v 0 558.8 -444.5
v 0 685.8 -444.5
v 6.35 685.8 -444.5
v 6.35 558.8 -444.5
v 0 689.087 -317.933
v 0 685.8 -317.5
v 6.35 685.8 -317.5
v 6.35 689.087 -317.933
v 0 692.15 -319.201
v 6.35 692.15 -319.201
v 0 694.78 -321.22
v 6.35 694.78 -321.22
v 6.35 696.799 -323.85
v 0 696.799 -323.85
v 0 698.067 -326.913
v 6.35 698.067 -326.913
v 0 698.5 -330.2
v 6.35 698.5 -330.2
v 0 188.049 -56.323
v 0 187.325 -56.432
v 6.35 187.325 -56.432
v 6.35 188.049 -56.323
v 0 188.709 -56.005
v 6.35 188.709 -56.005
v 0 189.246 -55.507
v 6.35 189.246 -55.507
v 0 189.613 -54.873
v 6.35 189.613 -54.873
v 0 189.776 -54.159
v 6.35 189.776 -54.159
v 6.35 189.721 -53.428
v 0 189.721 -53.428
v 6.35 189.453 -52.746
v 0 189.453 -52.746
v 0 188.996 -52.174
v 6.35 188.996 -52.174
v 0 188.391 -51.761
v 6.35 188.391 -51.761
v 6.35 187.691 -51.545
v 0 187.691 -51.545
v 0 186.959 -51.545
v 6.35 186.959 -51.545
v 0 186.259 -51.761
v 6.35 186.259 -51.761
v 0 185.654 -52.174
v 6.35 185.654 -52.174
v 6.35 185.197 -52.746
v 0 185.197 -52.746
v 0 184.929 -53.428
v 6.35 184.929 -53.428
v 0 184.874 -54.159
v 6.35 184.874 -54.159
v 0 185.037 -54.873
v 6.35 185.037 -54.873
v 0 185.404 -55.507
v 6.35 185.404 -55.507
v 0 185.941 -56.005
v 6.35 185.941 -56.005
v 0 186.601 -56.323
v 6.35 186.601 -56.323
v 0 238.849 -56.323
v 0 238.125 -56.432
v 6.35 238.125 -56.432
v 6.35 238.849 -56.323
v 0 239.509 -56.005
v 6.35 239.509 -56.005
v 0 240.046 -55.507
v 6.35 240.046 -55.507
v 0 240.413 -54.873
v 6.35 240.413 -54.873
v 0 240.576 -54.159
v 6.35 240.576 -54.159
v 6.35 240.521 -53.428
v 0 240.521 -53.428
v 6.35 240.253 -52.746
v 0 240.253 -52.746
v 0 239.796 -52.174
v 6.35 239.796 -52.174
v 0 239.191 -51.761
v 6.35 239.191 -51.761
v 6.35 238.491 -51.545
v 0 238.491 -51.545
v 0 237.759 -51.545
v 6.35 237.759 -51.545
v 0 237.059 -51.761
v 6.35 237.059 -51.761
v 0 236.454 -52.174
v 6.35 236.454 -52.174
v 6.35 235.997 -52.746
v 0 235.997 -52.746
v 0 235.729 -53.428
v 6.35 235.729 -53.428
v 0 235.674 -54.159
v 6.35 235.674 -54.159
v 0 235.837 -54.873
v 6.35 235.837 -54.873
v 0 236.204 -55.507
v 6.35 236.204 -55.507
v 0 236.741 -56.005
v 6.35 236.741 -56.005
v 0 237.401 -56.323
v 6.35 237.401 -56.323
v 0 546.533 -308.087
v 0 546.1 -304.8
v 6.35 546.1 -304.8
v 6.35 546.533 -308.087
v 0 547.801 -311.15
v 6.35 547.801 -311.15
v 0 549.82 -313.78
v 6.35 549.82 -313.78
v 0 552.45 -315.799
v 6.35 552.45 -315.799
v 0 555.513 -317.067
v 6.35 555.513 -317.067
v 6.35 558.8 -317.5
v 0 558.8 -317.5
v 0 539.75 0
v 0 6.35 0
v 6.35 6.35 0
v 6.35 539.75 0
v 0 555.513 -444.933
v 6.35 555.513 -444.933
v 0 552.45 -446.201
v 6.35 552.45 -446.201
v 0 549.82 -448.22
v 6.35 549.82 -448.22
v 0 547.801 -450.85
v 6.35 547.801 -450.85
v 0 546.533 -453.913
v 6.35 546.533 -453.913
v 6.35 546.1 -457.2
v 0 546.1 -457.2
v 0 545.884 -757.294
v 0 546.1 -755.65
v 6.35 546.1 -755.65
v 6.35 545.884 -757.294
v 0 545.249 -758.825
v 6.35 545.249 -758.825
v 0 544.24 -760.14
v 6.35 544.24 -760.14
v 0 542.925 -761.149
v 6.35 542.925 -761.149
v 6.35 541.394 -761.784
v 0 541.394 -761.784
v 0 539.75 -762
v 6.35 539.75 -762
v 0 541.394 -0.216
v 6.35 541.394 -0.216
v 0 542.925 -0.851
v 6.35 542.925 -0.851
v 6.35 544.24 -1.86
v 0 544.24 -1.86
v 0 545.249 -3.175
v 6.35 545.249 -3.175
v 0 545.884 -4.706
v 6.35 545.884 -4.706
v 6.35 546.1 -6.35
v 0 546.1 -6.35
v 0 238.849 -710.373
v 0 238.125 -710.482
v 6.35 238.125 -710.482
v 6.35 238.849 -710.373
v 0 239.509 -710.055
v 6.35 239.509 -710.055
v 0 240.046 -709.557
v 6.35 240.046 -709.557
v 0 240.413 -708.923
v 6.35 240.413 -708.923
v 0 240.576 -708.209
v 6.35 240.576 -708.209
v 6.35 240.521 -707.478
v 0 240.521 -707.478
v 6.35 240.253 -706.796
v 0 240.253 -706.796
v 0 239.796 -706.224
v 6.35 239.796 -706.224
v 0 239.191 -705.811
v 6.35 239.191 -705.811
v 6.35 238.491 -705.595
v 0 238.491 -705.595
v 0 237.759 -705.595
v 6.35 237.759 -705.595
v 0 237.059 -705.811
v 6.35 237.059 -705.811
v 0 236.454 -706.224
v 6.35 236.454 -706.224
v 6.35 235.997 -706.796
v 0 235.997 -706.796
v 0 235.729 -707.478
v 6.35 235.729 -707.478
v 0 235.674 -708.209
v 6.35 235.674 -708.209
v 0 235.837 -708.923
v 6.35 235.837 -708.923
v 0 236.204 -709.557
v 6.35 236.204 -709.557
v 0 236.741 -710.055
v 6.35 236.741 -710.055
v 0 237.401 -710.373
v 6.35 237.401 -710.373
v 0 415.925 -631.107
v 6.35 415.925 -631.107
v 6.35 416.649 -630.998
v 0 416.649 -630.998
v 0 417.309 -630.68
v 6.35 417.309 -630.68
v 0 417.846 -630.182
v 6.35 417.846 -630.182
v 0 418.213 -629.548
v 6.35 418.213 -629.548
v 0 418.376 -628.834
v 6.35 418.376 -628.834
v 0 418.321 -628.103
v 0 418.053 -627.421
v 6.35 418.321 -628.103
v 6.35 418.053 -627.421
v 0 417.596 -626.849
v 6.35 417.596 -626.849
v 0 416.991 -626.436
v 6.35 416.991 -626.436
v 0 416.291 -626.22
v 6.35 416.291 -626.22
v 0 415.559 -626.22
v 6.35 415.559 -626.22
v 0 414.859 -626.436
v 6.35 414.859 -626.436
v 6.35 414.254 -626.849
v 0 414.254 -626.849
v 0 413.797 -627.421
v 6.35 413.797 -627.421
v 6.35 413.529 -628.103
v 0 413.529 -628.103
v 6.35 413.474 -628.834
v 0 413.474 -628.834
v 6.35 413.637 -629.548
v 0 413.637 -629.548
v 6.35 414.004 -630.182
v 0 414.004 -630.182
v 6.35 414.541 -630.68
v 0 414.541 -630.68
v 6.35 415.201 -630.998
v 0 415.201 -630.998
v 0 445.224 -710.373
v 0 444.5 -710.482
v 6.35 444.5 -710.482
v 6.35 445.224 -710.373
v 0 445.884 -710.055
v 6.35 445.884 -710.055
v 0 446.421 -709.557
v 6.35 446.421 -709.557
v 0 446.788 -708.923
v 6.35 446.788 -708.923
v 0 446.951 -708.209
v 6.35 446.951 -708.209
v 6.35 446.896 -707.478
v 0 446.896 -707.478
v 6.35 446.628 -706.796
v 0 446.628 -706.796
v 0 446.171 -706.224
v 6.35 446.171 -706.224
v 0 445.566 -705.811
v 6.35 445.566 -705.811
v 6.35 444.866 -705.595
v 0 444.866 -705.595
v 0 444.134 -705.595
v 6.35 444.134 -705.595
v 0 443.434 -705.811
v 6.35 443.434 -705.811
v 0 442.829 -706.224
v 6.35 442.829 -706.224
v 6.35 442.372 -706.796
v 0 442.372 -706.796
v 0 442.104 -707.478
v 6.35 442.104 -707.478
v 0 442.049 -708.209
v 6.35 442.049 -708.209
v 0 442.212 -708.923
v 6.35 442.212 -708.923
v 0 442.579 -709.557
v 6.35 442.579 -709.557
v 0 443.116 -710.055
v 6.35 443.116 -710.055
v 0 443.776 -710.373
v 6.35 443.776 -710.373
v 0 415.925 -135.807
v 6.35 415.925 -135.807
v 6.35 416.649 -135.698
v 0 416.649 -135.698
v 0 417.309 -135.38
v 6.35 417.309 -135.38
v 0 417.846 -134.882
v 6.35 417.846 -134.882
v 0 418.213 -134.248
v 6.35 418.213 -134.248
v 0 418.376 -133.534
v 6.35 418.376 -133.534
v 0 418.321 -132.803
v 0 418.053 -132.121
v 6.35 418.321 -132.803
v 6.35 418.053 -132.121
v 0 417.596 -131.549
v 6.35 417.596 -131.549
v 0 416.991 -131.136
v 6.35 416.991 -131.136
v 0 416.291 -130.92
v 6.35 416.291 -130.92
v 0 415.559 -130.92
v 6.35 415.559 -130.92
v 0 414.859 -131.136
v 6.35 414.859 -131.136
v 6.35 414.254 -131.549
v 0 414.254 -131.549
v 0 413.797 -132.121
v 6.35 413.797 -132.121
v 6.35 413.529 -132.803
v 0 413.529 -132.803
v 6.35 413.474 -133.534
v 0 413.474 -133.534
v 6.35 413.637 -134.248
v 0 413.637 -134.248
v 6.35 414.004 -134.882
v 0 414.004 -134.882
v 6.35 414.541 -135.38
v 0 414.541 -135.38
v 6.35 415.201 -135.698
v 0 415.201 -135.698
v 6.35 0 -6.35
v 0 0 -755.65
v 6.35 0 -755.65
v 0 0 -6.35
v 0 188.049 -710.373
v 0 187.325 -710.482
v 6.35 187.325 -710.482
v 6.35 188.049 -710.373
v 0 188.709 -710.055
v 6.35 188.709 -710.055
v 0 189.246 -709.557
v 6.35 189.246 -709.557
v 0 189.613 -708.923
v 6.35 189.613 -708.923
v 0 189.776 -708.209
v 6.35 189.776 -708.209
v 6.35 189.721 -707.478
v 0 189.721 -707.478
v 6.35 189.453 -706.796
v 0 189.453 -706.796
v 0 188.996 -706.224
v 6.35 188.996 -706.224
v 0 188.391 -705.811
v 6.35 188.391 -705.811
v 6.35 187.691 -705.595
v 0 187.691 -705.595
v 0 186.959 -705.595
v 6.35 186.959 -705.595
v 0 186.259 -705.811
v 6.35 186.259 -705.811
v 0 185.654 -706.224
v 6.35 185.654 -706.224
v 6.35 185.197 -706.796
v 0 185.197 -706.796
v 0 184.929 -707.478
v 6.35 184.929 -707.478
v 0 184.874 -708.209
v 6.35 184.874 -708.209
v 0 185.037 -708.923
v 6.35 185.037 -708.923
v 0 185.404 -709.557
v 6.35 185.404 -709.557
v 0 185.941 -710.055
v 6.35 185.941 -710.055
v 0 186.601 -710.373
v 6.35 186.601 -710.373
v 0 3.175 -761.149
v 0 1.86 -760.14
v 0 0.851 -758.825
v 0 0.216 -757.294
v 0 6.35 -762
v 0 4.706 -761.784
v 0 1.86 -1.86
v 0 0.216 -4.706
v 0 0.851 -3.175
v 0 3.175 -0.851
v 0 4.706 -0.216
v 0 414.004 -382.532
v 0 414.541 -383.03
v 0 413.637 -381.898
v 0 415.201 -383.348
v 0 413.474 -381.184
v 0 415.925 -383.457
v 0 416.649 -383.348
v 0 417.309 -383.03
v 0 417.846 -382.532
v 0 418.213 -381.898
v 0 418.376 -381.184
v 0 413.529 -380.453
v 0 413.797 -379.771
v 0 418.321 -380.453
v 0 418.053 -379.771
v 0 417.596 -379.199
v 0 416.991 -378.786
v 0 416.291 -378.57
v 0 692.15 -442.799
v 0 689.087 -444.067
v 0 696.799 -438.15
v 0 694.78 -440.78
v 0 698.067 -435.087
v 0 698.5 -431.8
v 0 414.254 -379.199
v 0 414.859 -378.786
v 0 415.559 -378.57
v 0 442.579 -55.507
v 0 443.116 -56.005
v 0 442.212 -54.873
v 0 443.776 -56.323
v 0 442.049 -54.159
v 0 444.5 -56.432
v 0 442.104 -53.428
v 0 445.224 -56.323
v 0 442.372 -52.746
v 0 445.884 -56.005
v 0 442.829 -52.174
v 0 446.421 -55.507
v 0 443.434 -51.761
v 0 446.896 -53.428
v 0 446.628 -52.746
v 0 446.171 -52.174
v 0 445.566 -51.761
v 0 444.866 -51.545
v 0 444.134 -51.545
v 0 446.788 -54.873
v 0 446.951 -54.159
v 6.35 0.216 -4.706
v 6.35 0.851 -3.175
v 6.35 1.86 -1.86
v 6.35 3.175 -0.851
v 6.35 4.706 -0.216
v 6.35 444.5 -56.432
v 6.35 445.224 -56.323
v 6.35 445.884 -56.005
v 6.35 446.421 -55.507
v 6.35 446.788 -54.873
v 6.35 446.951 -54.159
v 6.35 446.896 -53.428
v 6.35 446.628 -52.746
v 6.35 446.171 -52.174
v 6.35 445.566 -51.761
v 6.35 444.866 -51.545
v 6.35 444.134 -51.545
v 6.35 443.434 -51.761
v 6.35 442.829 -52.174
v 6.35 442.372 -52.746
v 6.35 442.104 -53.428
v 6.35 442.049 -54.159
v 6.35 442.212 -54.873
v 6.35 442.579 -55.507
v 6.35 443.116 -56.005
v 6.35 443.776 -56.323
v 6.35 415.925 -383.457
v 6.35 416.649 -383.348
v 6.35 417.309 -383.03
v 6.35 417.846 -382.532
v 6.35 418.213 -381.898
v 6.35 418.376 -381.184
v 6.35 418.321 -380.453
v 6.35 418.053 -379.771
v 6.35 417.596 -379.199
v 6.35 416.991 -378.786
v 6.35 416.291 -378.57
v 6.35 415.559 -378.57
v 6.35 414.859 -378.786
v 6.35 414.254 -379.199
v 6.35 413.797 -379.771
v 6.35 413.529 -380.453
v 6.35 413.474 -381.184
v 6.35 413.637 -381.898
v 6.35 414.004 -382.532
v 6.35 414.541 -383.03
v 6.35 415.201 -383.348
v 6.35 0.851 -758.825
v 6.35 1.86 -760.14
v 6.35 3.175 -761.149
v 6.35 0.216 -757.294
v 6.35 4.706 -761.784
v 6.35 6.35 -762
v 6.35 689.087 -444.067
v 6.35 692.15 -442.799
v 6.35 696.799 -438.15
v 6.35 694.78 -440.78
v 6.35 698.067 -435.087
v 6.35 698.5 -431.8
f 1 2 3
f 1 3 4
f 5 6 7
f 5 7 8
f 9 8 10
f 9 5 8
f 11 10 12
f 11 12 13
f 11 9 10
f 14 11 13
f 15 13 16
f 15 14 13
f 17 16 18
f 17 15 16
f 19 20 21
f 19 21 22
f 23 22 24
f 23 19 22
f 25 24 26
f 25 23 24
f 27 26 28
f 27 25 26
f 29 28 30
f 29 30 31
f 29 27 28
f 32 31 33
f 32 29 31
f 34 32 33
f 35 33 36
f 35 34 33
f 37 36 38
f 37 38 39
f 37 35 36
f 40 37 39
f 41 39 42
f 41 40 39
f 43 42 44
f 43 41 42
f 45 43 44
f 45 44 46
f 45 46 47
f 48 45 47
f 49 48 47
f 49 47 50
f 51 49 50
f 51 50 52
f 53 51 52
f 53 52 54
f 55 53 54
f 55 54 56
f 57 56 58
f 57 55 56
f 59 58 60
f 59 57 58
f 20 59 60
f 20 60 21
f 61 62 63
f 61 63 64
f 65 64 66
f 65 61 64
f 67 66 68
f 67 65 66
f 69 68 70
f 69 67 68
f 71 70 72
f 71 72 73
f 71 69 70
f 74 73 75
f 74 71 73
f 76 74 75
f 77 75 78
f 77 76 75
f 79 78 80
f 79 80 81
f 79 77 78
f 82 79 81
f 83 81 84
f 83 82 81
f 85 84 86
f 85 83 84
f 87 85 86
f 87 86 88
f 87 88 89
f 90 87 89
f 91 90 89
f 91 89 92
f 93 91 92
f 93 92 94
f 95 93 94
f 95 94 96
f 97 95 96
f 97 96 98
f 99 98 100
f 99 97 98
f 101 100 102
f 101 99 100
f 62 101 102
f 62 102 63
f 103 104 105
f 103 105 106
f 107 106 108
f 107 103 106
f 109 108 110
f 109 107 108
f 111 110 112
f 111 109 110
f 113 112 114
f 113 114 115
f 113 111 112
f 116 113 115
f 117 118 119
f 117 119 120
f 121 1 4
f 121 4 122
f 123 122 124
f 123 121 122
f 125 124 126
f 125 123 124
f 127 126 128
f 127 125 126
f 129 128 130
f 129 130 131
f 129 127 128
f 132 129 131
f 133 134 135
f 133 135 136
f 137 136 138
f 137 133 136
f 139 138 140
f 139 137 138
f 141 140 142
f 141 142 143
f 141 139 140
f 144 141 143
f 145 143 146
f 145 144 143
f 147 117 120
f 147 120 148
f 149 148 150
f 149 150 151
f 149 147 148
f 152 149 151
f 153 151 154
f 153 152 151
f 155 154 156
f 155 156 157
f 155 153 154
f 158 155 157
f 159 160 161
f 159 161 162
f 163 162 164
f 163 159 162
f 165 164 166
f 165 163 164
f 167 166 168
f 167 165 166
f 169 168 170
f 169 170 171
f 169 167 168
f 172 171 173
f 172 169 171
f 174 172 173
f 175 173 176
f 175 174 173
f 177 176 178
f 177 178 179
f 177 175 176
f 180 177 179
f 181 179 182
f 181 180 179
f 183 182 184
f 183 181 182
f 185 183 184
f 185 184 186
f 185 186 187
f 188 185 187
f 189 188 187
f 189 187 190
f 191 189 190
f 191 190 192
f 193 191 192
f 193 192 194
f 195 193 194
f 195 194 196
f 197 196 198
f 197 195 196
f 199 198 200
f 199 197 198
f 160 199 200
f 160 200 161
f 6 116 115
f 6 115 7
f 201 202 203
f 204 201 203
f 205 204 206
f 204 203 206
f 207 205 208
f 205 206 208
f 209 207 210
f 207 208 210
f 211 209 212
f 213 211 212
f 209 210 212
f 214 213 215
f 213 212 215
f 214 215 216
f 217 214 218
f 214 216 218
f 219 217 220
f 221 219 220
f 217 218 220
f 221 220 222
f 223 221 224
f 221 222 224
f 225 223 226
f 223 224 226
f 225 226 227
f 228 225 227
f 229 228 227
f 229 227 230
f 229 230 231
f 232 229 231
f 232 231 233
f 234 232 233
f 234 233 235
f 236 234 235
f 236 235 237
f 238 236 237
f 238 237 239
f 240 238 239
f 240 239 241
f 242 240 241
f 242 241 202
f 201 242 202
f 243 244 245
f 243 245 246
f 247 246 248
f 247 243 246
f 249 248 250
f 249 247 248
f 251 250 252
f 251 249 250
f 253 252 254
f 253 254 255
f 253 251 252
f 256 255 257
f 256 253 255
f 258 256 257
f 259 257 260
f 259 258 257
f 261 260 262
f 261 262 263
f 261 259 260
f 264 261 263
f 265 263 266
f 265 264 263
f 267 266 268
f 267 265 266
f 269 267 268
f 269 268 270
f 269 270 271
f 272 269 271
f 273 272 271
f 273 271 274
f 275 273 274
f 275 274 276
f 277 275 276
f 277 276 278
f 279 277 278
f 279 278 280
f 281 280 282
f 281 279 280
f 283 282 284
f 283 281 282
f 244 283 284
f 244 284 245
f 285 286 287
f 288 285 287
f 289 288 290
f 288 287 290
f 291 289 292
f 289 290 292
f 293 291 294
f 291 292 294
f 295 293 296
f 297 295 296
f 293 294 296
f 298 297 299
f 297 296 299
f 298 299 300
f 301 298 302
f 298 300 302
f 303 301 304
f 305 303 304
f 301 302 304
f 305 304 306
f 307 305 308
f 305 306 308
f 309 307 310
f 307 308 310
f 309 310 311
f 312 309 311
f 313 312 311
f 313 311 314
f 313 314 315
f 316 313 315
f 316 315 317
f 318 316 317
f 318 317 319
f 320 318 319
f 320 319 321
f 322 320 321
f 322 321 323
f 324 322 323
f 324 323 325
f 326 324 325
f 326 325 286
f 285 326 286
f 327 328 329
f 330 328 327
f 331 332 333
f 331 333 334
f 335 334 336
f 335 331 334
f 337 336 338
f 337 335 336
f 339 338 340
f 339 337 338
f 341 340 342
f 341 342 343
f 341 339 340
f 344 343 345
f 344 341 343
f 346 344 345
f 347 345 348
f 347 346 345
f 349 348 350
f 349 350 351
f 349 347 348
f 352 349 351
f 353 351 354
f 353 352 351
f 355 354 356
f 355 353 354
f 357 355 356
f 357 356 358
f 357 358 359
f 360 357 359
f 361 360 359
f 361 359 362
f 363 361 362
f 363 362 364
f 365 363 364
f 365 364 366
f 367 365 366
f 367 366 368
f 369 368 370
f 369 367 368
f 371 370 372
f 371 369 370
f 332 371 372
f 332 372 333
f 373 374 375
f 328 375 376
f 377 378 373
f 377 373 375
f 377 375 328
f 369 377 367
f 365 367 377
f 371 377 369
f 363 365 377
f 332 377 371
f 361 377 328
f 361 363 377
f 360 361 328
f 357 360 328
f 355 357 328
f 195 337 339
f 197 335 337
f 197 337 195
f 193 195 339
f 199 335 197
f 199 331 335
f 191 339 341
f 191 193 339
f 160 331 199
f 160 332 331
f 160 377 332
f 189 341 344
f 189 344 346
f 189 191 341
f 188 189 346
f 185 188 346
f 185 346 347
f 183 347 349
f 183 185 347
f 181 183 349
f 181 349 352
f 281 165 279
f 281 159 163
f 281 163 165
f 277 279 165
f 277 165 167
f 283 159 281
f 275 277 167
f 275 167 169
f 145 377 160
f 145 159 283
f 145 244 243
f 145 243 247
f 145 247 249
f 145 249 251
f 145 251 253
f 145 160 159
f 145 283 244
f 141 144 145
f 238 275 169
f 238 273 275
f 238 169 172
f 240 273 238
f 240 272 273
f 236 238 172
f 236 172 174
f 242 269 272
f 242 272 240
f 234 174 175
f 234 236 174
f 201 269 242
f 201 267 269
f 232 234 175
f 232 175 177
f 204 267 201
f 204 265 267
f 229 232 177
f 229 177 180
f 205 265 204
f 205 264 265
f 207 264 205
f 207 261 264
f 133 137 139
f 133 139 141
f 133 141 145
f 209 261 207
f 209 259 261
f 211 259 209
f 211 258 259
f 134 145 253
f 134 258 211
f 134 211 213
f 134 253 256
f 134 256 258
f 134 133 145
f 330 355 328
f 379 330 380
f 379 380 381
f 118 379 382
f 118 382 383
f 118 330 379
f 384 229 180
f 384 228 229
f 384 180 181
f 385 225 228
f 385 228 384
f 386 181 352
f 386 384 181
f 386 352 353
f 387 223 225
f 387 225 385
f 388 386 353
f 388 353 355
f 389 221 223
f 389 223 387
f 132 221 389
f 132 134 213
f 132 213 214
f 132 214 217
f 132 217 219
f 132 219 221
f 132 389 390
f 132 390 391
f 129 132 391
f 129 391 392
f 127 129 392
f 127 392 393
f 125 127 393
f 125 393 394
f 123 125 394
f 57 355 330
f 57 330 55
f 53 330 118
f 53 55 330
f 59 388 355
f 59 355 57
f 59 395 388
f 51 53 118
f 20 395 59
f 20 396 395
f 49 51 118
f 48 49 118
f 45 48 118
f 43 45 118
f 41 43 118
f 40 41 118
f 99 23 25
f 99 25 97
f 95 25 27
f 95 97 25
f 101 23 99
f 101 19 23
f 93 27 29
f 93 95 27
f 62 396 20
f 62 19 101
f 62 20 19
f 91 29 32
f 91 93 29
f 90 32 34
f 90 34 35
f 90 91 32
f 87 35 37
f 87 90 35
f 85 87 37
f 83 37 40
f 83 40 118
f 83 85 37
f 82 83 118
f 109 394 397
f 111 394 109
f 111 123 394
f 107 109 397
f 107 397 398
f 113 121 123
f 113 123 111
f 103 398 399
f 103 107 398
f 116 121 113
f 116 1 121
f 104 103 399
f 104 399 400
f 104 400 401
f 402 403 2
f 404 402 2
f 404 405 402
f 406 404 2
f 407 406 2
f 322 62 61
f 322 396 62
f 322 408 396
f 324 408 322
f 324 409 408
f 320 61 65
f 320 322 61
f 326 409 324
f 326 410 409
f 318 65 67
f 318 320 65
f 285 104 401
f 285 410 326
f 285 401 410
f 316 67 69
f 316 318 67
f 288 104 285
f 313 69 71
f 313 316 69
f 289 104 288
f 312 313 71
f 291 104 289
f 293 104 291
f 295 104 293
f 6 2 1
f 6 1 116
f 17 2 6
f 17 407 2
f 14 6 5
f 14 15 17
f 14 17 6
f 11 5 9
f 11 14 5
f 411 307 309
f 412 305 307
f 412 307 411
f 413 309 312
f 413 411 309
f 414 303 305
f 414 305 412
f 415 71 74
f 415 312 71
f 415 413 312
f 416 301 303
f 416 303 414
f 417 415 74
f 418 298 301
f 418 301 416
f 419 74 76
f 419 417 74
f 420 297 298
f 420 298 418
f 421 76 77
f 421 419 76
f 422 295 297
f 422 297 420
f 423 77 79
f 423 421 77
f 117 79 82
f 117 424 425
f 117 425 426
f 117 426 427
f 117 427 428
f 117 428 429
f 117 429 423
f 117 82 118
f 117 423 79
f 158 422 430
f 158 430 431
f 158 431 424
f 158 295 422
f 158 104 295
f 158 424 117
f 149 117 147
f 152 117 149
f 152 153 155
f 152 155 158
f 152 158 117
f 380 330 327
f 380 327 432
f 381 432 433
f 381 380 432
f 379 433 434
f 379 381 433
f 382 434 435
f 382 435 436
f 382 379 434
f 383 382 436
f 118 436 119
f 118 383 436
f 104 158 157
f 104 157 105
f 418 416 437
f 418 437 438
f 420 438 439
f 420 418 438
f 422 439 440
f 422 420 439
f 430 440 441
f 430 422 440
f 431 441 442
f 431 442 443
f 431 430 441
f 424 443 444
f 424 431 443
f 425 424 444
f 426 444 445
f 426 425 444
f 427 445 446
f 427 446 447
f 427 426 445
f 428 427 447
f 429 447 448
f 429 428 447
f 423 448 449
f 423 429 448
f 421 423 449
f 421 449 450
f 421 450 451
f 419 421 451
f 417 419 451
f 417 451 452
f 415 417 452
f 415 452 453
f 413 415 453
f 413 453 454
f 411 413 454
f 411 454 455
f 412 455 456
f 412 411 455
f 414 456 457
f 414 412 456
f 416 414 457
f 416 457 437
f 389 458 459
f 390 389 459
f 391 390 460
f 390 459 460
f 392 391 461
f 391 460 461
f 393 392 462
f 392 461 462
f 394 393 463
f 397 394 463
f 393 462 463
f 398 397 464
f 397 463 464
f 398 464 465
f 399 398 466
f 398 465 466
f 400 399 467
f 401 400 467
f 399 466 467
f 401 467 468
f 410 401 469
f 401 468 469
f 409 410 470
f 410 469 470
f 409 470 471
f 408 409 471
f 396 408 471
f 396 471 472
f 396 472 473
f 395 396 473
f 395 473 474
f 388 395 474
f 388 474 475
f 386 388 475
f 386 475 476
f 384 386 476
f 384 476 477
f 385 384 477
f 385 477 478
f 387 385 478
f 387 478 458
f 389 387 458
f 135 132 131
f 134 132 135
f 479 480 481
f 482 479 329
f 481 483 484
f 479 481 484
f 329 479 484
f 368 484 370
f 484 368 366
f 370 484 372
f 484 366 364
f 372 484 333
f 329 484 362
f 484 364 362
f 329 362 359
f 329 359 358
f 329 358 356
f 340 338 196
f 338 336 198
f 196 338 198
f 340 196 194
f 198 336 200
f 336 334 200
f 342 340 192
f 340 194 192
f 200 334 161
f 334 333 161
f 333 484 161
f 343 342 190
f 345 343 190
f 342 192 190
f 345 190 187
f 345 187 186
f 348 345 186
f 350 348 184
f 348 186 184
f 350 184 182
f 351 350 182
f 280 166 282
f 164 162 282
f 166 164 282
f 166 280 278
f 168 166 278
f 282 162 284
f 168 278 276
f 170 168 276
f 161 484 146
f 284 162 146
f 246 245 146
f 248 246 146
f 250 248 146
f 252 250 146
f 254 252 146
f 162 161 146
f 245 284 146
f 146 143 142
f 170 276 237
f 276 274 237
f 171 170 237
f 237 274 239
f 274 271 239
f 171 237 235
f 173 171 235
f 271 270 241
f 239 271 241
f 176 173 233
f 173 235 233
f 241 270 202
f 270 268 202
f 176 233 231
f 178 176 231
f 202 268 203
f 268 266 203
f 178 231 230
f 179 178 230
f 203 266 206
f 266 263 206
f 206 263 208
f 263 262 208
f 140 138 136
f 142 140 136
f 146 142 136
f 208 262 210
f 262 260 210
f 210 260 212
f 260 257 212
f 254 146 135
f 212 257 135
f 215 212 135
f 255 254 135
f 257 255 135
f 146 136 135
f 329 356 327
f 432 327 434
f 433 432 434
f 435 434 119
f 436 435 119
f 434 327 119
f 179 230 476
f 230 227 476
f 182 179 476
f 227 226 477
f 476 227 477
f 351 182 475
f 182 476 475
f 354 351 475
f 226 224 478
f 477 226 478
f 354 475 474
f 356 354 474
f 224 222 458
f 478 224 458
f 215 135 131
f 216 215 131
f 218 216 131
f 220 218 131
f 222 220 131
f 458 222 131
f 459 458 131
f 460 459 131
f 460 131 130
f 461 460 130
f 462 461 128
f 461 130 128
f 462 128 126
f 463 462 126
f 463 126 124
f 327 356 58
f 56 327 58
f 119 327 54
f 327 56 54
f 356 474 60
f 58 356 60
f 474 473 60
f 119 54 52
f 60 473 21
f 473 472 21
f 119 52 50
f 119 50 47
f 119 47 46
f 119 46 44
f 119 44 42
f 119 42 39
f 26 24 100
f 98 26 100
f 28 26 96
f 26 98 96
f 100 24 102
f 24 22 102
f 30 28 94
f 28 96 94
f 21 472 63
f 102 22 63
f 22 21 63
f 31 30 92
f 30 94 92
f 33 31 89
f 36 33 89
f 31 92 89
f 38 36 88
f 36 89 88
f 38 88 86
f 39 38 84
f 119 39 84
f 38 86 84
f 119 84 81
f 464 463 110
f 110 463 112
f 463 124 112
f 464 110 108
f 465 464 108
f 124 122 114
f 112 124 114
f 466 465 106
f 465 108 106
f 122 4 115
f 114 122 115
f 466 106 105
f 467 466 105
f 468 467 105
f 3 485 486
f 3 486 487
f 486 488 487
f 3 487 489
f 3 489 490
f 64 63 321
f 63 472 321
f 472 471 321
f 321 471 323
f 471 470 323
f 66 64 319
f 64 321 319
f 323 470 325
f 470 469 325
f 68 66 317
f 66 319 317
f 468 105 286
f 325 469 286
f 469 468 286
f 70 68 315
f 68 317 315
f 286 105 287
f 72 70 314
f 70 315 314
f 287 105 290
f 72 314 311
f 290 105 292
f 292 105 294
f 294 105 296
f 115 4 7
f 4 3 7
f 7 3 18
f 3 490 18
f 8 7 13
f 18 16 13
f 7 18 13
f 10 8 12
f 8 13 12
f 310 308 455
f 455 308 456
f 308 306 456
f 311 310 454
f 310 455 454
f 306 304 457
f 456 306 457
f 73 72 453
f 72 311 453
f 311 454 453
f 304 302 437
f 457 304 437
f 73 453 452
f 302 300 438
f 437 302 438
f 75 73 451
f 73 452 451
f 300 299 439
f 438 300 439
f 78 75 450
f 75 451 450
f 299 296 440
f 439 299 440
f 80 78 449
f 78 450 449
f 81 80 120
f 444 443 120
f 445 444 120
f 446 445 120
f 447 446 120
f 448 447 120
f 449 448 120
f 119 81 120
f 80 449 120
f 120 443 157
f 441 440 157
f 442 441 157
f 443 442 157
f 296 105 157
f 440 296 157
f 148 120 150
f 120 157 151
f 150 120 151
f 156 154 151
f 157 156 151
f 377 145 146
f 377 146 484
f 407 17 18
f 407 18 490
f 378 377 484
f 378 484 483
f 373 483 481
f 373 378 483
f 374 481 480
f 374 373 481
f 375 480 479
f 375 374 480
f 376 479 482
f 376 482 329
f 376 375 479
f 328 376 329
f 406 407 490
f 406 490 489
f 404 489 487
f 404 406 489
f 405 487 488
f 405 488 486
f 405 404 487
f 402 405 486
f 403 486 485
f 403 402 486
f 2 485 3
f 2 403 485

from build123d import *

# Parameters (mm, degrees)
SKETCH1_R           = 2.45745
BOSS_EXTRUDE1_DEPTH = 6.35
SKETCH3_R           = 2.45745
CUT_EXTRUDE2_DEPTH  = 1034.724611538


with BuildPart() as part:
    # Sketch1 → Boss-Extrude1 (new body)
    with BuildSketch(Plane(origin=(0, 0, 0), x_dir=(0, 0, -1), z_dir=(1, 0, 0))):
        with BuildLine():
            Line((457.2, 546.1), (755.65, 546.1))
            ThreePointArc((755.65, 546.1), (760.140128061, 544.240128061), (762, 539.75))
            Line((762, 539.75), (762, 6.35))
            ThreePointArc((762, 6.35), (760.140128061, 1.859871939), (755.65, 0))
            Line((755.65, 0), (6.35, 0))
            ThreePointArc((6.35, 0), (1.859871939, 1.859871939), (0, 6.35))
            Line((0, 6.35), (0, 539.75))
            ThreePointArc((0, 539.75), (1.859871939, 544.240128061), (6.35, 546.1))
            Line((6.35, 546.1), (304.8, 546.1))
            ThreePointArc((304.8, 546.1), (313.780256121, 549.819743879), (317.5, 558.8))
            Line((317.5, 558.8), (317.5, 685.8))
            ThreePointArc((317.5, 685.8), (321.219743879, 694.780256121), (330.2, 698.5))
            Line((330.2, 698.5), (431.8, 698.5))
            ThreePointArc((431.8, 698.5), (440.780256121, 694.780256121), (444.5, 685.8))
            Line((444.5, 685.8), (444.5, 558.8))
            ThreePointArc((444.5, 558.8), (448.219743879, 549.819743879), (457.2, 546.1))
        make_face()
        with Locations((53.975, 444.5)):
            Circle(SKETCH1_R, mode=Mode.SUBTRACT)
        with Locations((708.025, 444.5)):
            Circle(SKETCH1_R, mode=Mode.SUBTRACT)
        with Locations((708.025, 238.125)):
            Circle(SKETCH1_R, mode=Mode.SUBTRACT)
        with Locations((53.975, 238.125)):
            Circle(SKETCH1_R, mode=Mode.SUBTRACT)
        with Locations((53.975, 187.325)):
            Circle(SKETCH1_R, mode=Mode.SUBTRACT)
        with Locations((708.025, 187.325)):
            Circle(SKETCH1_R, mode=Mode.SUBTRACT)
    extrude(amount=BOSS_EXTRUDE1_DEPTH)

    # Sketch3 → Cut-Extrude2 (cut, through all)
    with BuildSketch(Plane(origin=(6.35, 0, 0), x_dir=(0, 0, -1), z_dir=(1, 0, 0))):
        with Locations((133.35, 415.925)):
            Circle(SKETCH3_R)
        with Locations((381, 415.925)):
            Circle(SKETCH3_R)
        with Locations((628.65, 415.925)):
            Circle(SKETCH3_R)
    extrude(amount=-CUT_EXTRUDE2_DEPTH, mode=Mode.SUBTRACT)


solid = part.part
